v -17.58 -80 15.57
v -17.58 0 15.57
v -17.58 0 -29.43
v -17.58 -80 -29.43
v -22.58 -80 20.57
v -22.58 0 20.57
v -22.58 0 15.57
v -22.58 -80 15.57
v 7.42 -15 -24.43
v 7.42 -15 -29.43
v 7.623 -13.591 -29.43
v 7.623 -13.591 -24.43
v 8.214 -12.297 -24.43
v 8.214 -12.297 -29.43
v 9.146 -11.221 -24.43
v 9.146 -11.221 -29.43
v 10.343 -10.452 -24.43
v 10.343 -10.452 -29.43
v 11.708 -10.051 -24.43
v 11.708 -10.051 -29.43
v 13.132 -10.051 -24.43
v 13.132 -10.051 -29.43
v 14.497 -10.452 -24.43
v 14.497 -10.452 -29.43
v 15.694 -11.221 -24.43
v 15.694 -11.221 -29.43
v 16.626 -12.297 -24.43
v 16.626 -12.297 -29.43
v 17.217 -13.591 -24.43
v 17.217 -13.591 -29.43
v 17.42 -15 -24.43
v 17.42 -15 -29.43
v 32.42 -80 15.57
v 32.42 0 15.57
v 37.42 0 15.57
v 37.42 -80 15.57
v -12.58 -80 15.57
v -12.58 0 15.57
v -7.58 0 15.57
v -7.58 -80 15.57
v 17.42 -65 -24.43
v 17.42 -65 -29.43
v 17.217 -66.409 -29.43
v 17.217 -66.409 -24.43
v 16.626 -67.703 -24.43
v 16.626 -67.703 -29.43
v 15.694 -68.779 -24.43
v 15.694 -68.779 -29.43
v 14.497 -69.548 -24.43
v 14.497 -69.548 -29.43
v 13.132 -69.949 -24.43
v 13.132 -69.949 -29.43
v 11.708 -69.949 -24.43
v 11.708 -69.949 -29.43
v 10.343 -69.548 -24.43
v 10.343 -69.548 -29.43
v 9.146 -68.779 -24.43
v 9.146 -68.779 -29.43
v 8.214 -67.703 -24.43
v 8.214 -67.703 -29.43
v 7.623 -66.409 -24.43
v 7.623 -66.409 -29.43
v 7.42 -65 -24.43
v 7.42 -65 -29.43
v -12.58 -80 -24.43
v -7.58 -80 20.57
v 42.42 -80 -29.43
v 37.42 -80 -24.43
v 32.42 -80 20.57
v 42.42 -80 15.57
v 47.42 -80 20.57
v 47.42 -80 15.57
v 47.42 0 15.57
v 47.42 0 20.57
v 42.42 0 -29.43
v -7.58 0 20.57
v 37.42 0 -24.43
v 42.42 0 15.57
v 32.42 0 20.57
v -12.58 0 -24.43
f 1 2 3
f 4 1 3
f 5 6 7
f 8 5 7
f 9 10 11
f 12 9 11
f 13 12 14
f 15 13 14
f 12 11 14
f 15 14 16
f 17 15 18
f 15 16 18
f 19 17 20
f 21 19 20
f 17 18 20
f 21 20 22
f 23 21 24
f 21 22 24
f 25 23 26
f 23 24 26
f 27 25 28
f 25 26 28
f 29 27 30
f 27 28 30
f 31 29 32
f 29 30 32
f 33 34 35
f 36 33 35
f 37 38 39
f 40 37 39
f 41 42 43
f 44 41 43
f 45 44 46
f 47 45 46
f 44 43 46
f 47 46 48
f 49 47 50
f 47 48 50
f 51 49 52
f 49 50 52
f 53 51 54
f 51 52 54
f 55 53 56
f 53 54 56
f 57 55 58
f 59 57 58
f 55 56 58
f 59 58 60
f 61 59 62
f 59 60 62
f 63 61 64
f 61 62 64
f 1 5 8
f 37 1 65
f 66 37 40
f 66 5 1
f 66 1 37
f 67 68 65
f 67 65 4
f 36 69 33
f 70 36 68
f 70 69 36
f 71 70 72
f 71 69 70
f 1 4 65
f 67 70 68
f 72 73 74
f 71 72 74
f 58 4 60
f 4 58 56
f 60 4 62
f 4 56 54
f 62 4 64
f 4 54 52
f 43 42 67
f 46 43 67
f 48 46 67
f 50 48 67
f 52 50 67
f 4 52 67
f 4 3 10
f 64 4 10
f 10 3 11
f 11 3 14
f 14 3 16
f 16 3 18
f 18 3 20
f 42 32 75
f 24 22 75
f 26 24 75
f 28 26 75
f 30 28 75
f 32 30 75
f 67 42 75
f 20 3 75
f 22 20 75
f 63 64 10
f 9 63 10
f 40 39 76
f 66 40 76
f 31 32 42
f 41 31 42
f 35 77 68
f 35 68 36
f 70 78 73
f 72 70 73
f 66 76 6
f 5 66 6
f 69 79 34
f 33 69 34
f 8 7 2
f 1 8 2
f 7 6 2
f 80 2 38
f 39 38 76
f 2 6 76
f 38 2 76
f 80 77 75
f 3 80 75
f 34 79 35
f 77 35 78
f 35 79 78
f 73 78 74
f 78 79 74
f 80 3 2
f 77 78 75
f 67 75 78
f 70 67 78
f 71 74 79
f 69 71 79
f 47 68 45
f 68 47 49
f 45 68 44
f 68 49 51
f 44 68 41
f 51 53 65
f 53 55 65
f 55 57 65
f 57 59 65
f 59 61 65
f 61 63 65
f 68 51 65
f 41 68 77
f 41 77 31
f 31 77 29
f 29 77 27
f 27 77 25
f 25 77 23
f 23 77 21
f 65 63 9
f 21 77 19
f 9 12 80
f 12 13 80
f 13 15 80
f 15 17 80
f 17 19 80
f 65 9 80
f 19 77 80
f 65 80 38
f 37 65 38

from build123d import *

# Parameters (mm, degrees)
F0_W     = 5
F0_H     = 40
F1_DEPTH = 80
F3_DEPTH = 25


with BuildPart() as f1:
    # F0 (on Front) → F1 (new body)
    with BuildSketch(Plane.XZ):
        with Locations((-15.079972, -4.429811)):
            Rectangle(F0_W, F0_H)
        Polygon((-12.579972, -24.429811), (-17.579972, -24.429811), (-17.579972, -29.429809), (42.420028, -29.429809), (42.420028, -24.429811), (37.420028, -24.429811), align=None)
        Polygon((-22.579972, 15.570189), (-17.579972, 15.570189), (-12.579972, 15.570189), (-7.579972, 15.570189), (-7.579972, 20.570189), (-22.579972, 20.570189), align=None)
        with Locations((39.920028, -4.429811)):
            Rectangle(F0_W, F0_H)
        Polygon((32.420028, 15.570189), (37.420028, 15.570189), (42.420028, 15.570189), (47.420028, 15.570189), (47.420028, 20.570189), (32.420028, 20.570189), align=None)
    extrude(amount=F1_DEPTH)

    # F2 (on face) → F3 (cut)
    with BuildSketch(Plane(origin=(0, 0, -29.429809), x_dir=(1, 0, 0), z_dir=(0, 0, -1))):
        with BuildLine():
            ThreePointArc((17.420028, 65), (12.420028, 70), (7.420028, 65))
            Line((7.420028, 65), (7.420028, 15))
            ThreePointArc((7.420028, 15), (12.420028, 10), (17.420028, 15))
            Line((17.420028, 15), (17.420028, 65))
        make_face()
    extrude(amount=-F3_DEPTH, mode=Mode.SUBTRACT)


solid = f1.part
